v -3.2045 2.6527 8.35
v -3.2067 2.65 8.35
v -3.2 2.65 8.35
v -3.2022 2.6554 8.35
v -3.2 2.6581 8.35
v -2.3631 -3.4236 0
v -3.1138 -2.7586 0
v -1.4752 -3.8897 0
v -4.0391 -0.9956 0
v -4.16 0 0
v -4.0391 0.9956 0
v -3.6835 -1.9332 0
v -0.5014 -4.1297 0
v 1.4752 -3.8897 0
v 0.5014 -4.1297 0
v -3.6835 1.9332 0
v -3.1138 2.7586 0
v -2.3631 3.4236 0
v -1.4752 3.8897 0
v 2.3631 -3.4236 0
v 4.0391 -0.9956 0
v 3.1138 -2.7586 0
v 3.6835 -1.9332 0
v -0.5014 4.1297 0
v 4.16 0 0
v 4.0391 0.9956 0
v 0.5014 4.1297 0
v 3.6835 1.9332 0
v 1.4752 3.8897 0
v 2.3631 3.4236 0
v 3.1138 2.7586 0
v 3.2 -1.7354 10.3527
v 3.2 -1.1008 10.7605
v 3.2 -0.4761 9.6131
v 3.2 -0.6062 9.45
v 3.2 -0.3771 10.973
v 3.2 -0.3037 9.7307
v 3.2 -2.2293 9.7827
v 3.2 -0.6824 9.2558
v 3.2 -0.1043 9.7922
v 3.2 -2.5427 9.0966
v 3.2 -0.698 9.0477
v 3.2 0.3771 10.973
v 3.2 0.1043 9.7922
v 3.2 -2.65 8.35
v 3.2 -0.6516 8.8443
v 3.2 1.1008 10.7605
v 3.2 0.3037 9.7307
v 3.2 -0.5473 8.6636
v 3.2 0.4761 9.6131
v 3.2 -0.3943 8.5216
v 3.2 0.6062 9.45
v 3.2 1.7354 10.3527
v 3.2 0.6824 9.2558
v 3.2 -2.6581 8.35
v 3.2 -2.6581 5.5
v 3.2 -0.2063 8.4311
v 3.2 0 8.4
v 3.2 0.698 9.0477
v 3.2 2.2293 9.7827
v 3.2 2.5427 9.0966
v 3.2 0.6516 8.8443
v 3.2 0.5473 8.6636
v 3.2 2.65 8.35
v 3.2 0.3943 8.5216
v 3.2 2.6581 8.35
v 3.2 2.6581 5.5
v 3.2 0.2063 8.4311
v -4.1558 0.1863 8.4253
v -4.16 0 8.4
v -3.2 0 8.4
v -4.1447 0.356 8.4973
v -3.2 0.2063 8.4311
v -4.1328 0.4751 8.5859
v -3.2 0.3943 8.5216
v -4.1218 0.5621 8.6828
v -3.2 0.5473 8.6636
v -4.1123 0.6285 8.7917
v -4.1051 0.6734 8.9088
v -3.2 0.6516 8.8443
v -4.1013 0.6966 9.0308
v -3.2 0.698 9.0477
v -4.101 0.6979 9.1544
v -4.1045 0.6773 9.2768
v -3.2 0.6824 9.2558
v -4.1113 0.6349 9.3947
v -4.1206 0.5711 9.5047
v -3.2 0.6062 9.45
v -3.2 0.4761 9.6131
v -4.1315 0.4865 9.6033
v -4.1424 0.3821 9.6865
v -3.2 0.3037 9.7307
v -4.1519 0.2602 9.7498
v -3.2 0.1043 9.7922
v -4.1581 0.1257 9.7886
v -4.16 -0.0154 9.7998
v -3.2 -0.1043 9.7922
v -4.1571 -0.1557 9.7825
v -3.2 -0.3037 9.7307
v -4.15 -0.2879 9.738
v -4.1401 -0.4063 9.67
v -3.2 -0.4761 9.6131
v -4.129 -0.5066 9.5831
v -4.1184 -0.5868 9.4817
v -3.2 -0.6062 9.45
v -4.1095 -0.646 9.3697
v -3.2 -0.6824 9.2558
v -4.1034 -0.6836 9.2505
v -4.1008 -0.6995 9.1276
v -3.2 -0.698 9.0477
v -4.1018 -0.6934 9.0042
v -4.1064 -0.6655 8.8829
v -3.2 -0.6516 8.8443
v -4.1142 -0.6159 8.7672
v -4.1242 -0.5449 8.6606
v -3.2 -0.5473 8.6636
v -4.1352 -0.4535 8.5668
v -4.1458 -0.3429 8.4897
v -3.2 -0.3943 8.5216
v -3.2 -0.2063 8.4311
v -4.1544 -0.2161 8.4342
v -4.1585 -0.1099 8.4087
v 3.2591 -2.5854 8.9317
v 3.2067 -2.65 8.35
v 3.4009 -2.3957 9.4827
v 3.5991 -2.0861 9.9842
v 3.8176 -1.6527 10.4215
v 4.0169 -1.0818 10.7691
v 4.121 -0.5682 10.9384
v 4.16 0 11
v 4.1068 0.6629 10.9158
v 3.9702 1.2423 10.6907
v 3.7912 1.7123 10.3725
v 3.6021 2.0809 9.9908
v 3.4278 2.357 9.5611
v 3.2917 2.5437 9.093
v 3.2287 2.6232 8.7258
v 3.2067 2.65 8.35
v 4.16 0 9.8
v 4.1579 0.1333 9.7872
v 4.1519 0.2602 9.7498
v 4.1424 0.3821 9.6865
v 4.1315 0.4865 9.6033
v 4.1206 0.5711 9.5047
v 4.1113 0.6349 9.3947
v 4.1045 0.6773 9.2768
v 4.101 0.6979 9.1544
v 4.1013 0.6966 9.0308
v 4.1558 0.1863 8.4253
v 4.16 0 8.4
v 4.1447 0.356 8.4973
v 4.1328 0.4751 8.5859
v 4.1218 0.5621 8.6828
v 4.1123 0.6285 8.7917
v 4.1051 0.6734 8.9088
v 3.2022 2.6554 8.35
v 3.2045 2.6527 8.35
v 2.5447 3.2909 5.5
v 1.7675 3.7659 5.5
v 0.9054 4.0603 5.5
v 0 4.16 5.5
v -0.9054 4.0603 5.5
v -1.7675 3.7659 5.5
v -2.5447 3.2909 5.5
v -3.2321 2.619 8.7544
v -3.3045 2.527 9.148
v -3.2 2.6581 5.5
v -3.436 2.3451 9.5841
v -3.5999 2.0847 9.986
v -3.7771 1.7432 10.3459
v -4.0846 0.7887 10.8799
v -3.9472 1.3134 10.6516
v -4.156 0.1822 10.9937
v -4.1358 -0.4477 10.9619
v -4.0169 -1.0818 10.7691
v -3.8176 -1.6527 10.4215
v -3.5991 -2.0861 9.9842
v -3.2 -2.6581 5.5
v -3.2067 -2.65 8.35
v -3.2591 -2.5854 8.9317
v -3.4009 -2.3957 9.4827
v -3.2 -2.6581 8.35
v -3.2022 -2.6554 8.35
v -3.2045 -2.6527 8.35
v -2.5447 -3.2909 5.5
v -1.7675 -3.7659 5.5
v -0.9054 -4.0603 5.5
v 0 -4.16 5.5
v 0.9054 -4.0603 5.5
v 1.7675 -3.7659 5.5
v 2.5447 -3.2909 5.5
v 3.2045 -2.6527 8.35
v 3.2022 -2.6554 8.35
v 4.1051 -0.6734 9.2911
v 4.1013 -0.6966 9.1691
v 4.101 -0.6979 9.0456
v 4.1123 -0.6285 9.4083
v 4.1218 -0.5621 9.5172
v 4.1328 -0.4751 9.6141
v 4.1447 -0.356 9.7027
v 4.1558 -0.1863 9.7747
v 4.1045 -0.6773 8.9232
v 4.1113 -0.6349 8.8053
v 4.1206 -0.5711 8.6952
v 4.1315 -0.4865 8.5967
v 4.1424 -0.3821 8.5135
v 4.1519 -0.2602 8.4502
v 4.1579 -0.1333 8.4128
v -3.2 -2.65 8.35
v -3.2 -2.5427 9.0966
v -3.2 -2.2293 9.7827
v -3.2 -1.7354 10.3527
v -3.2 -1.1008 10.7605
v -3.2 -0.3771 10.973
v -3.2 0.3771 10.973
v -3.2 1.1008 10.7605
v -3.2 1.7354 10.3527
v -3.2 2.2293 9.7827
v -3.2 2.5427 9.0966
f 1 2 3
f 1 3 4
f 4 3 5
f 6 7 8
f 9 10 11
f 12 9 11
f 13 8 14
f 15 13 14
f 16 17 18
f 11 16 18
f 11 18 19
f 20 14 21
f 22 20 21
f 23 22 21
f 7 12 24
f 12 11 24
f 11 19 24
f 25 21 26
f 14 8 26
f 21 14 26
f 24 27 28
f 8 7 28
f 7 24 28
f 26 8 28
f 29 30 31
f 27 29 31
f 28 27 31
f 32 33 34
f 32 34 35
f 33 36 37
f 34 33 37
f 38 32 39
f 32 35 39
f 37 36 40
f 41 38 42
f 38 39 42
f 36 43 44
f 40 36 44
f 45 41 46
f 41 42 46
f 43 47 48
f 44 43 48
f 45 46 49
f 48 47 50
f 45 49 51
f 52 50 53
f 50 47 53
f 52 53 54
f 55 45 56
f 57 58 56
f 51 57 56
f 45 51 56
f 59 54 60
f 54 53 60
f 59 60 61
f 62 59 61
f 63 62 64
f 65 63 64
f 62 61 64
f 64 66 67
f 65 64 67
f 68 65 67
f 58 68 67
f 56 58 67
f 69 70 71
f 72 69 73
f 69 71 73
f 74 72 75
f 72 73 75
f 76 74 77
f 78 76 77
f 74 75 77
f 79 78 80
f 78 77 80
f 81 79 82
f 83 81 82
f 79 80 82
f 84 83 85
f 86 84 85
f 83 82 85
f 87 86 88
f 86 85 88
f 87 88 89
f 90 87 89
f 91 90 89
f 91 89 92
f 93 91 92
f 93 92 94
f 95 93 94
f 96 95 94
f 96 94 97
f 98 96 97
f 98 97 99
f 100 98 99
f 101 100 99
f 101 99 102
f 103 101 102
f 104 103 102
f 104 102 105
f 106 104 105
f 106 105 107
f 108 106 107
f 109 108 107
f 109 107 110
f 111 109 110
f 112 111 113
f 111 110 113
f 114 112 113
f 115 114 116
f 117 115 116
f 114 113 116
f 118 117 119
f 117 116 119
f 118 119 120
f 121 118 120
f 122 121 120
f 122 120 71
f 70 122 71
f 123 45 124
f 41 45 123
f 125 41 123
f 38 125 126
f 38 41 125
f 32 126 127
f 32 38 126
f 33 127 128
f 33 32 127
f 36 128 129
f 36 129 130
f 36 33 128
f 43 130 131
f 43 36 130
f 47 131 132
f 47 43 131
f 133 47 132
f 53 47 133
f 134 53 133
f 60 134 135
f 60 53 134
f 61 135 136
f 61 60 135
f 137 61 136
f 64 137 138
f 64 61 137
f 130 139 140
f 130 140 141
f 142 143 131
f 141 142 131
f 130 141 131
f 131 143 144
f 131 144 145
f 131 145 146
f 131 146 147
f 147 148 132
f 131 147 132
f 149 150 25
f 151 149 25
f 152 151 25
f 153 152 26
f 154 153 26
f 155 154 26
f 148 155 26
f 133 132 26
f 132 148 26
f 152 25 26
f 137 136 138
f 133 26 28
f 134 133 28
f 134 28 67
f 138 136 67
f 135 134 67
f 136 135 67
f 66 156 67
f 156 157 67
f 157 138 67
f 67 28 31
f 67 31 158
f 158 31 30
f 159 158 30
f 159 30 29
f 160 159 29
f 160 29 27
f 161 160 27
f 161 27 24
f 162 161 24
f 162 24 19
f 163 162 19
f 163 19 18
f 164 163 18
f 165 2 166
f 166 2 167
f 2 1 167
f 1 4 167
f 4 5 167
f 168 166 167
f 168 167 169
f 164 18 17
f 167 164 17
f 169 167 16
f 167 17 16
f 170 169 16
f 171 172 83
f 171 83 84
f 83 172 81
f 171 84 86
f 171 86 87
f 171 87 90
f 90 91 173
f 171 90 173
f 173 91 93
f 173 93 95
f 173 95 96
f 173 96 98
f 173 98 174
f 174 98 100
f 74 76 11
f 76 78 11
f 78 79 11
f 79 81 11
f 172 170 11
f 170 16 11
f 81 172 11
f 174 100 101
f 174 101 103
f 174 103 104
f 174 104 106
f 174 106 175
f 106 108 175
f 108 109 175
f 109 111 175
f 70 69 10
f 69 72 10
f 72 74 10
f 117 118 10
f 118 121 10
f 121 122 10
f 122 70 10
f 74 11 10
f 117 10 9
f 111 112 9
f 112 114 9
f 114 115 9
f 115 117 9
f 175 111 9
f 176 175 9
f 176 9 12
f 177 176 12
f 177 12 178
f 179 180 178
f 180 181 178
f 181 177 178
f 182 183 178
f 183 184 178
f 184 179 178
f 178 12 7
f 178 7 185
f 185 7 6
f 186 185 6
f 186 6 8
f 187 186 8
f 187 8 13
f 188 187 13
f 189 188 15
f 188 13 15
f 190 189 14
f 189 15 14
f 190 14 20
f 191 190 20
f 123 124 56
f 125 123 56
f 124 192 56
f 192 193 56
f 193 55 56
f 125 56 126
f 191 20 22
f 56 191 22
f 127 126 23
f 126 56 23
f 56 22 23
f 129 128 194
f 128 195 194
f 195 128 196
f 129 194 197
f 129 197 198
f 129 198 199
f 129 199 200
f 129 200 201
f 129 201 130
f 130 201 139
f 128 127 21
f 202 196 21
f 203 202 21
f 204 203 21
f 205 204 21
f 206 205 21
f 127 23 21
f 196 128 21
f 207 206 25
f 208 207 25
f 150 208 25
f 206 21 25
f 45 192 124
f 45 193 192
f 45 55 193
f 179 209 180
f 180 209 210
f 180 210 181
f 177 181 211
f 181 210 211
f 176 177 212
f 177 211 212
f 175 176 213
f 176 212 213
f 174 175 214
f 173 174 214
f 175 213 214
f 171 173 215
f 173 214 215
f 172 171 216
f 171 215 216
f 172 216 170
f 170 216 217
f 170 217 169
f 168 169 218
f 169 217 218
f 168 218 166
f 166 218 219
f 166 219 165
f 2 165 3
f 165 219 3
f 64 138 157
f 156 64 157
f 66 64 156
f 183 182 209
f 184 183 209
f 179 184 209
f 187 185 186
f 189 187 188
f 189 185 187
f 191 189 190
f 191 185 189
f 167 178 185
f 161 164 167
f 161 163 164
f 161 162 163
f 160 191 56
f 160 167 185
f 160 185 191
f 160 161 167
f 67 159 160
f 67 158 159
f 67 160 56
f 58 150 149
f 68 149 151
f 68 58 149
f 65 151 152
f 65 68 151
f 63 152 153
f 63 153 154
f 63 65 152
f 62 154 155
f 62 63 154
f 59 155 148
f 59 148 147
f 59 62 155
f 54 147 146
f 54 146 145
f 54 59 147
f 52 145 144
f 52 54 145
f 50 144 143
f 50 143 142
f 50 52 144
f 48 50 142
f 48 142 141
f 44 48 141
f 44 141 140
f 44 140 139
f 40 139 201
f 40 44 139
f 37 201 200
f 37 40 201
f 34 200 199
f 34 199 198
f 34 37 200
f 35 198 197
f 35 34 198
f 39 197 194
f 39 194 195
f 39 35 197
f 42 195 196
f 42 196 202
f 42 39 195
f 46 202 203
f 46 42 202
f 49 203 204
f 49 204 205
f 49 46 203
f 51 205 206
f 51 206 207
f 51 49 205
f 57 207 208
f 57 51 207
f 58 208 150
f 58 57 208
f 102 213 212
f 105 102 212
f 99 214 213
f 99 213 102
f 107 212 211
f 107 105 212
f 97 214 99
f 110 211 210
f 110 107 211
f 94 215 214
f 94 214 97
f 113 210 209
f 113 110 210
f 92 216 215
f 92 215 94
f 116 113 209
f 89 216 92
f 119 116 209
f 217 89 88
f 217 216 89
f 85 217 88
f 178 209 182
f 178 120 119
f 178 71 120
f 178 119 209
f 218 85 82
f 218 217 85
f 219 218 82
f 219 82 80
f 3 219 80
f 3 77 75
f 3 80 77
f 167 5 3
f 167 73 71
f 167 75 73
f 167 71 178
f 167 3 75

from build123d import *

# Parameters (mm, degrees)
SKETCH1_R           = 4.16
EXTRUDE1_DEPTH      = 11
SKETCH2_W           = 6.4
SKETCH2_H           = 6.357406019
EXTRUDE2_DEPTH      = 5.16
EXTRUDE2_DEPTH_BACK = 5.16
EXTRUDE3_DEPTH      = 5.16
EXTRUDE3_DEPTH_BACK = 5.16
SKETCH4_R           = 0.7
EXTRUDE4_DEPTH      = 5.1600001
EXTRUDE4_DEPTH_BACK = 5.1600001


with BuildPart() as part:
    # Sketch1 → Extrude1 (new body)
    with BuildSketch(Plane.XY):
        Circle(SKETCH1_R)
    extrude(amount=EXTRUDE1_DEPTH)

    # Sketch2 → Extrude2 (cut, two sides)
    with BuildSketch(Plane(origin=(0, 0, 0), x_dir=(1, 0, 0), z_dir=(0, 1, 0))) as extrude2_sk:
        with Locations((0, -8.67870301)):
            Rectangle(SKETCH2_W, SKETCH2_H)
    extrude(amount=EXTRUDE2_DEPTH, mode=Mode.SUBTRACT)
    extrude(extrude2_sk.sketch, amount=-EXTRUDE2_DEPTH_BACK, mode=Mode.SUBTRACT)

    # Sketch3 → Extrude3 (cut, two sides)
    with BuildSketch(Plane(origin=(0, 0, 0), x_dir=(0, 0, -1), z_dir=(1, 0, 0))) as extrude3_sk:
        with BuildLine():
            Line((-8.35, 2.65), (-8.35, 3.836721977))
            Line((-8.35, 3.836721977), (-12.822156105, 3.836721977))
            Line((-12.822156105, 3.836721977), (-12.822156105, -4.605164147))
            Line((-12.822156105, -4.605164147), (-8.35, -4.492230912))
            Line((-8.35, -4.492230912), (-8.35, -2.65))
            ThreePointArc((-8.35, -2.65), (-11, 0), (-8.35, 2.65))
        make_face()
    extrude(amount=EXTRUDE3_DEPTH, mode=Mode.SUBTRACT)
    extrude(extrude3_sk.sketch, amount=-EXTRUDE3_DEPTH_BACK, mode=Mode.SUBTRACT)

    # Sketch4 → Extrude4 (cut, two sides)
    with BuildSketch(Plane(origin=(0, 0, 0), x_dir=(0, 0, -1), z_dir=(1, 0, 0))) as extrude4_sk:
        with Locations((-9.1, 0)):
            Circle(SKETCH4_R)
    extrude(amount=EXTRUDE4_DEPTH, mode=Mode.SUBTRACT)
    extrude(extrude4_sk.sketch, amount=-EXTRUDE4_DEPTH_BACK, mode=Mode.SUBTRACT)


solid = part.part
